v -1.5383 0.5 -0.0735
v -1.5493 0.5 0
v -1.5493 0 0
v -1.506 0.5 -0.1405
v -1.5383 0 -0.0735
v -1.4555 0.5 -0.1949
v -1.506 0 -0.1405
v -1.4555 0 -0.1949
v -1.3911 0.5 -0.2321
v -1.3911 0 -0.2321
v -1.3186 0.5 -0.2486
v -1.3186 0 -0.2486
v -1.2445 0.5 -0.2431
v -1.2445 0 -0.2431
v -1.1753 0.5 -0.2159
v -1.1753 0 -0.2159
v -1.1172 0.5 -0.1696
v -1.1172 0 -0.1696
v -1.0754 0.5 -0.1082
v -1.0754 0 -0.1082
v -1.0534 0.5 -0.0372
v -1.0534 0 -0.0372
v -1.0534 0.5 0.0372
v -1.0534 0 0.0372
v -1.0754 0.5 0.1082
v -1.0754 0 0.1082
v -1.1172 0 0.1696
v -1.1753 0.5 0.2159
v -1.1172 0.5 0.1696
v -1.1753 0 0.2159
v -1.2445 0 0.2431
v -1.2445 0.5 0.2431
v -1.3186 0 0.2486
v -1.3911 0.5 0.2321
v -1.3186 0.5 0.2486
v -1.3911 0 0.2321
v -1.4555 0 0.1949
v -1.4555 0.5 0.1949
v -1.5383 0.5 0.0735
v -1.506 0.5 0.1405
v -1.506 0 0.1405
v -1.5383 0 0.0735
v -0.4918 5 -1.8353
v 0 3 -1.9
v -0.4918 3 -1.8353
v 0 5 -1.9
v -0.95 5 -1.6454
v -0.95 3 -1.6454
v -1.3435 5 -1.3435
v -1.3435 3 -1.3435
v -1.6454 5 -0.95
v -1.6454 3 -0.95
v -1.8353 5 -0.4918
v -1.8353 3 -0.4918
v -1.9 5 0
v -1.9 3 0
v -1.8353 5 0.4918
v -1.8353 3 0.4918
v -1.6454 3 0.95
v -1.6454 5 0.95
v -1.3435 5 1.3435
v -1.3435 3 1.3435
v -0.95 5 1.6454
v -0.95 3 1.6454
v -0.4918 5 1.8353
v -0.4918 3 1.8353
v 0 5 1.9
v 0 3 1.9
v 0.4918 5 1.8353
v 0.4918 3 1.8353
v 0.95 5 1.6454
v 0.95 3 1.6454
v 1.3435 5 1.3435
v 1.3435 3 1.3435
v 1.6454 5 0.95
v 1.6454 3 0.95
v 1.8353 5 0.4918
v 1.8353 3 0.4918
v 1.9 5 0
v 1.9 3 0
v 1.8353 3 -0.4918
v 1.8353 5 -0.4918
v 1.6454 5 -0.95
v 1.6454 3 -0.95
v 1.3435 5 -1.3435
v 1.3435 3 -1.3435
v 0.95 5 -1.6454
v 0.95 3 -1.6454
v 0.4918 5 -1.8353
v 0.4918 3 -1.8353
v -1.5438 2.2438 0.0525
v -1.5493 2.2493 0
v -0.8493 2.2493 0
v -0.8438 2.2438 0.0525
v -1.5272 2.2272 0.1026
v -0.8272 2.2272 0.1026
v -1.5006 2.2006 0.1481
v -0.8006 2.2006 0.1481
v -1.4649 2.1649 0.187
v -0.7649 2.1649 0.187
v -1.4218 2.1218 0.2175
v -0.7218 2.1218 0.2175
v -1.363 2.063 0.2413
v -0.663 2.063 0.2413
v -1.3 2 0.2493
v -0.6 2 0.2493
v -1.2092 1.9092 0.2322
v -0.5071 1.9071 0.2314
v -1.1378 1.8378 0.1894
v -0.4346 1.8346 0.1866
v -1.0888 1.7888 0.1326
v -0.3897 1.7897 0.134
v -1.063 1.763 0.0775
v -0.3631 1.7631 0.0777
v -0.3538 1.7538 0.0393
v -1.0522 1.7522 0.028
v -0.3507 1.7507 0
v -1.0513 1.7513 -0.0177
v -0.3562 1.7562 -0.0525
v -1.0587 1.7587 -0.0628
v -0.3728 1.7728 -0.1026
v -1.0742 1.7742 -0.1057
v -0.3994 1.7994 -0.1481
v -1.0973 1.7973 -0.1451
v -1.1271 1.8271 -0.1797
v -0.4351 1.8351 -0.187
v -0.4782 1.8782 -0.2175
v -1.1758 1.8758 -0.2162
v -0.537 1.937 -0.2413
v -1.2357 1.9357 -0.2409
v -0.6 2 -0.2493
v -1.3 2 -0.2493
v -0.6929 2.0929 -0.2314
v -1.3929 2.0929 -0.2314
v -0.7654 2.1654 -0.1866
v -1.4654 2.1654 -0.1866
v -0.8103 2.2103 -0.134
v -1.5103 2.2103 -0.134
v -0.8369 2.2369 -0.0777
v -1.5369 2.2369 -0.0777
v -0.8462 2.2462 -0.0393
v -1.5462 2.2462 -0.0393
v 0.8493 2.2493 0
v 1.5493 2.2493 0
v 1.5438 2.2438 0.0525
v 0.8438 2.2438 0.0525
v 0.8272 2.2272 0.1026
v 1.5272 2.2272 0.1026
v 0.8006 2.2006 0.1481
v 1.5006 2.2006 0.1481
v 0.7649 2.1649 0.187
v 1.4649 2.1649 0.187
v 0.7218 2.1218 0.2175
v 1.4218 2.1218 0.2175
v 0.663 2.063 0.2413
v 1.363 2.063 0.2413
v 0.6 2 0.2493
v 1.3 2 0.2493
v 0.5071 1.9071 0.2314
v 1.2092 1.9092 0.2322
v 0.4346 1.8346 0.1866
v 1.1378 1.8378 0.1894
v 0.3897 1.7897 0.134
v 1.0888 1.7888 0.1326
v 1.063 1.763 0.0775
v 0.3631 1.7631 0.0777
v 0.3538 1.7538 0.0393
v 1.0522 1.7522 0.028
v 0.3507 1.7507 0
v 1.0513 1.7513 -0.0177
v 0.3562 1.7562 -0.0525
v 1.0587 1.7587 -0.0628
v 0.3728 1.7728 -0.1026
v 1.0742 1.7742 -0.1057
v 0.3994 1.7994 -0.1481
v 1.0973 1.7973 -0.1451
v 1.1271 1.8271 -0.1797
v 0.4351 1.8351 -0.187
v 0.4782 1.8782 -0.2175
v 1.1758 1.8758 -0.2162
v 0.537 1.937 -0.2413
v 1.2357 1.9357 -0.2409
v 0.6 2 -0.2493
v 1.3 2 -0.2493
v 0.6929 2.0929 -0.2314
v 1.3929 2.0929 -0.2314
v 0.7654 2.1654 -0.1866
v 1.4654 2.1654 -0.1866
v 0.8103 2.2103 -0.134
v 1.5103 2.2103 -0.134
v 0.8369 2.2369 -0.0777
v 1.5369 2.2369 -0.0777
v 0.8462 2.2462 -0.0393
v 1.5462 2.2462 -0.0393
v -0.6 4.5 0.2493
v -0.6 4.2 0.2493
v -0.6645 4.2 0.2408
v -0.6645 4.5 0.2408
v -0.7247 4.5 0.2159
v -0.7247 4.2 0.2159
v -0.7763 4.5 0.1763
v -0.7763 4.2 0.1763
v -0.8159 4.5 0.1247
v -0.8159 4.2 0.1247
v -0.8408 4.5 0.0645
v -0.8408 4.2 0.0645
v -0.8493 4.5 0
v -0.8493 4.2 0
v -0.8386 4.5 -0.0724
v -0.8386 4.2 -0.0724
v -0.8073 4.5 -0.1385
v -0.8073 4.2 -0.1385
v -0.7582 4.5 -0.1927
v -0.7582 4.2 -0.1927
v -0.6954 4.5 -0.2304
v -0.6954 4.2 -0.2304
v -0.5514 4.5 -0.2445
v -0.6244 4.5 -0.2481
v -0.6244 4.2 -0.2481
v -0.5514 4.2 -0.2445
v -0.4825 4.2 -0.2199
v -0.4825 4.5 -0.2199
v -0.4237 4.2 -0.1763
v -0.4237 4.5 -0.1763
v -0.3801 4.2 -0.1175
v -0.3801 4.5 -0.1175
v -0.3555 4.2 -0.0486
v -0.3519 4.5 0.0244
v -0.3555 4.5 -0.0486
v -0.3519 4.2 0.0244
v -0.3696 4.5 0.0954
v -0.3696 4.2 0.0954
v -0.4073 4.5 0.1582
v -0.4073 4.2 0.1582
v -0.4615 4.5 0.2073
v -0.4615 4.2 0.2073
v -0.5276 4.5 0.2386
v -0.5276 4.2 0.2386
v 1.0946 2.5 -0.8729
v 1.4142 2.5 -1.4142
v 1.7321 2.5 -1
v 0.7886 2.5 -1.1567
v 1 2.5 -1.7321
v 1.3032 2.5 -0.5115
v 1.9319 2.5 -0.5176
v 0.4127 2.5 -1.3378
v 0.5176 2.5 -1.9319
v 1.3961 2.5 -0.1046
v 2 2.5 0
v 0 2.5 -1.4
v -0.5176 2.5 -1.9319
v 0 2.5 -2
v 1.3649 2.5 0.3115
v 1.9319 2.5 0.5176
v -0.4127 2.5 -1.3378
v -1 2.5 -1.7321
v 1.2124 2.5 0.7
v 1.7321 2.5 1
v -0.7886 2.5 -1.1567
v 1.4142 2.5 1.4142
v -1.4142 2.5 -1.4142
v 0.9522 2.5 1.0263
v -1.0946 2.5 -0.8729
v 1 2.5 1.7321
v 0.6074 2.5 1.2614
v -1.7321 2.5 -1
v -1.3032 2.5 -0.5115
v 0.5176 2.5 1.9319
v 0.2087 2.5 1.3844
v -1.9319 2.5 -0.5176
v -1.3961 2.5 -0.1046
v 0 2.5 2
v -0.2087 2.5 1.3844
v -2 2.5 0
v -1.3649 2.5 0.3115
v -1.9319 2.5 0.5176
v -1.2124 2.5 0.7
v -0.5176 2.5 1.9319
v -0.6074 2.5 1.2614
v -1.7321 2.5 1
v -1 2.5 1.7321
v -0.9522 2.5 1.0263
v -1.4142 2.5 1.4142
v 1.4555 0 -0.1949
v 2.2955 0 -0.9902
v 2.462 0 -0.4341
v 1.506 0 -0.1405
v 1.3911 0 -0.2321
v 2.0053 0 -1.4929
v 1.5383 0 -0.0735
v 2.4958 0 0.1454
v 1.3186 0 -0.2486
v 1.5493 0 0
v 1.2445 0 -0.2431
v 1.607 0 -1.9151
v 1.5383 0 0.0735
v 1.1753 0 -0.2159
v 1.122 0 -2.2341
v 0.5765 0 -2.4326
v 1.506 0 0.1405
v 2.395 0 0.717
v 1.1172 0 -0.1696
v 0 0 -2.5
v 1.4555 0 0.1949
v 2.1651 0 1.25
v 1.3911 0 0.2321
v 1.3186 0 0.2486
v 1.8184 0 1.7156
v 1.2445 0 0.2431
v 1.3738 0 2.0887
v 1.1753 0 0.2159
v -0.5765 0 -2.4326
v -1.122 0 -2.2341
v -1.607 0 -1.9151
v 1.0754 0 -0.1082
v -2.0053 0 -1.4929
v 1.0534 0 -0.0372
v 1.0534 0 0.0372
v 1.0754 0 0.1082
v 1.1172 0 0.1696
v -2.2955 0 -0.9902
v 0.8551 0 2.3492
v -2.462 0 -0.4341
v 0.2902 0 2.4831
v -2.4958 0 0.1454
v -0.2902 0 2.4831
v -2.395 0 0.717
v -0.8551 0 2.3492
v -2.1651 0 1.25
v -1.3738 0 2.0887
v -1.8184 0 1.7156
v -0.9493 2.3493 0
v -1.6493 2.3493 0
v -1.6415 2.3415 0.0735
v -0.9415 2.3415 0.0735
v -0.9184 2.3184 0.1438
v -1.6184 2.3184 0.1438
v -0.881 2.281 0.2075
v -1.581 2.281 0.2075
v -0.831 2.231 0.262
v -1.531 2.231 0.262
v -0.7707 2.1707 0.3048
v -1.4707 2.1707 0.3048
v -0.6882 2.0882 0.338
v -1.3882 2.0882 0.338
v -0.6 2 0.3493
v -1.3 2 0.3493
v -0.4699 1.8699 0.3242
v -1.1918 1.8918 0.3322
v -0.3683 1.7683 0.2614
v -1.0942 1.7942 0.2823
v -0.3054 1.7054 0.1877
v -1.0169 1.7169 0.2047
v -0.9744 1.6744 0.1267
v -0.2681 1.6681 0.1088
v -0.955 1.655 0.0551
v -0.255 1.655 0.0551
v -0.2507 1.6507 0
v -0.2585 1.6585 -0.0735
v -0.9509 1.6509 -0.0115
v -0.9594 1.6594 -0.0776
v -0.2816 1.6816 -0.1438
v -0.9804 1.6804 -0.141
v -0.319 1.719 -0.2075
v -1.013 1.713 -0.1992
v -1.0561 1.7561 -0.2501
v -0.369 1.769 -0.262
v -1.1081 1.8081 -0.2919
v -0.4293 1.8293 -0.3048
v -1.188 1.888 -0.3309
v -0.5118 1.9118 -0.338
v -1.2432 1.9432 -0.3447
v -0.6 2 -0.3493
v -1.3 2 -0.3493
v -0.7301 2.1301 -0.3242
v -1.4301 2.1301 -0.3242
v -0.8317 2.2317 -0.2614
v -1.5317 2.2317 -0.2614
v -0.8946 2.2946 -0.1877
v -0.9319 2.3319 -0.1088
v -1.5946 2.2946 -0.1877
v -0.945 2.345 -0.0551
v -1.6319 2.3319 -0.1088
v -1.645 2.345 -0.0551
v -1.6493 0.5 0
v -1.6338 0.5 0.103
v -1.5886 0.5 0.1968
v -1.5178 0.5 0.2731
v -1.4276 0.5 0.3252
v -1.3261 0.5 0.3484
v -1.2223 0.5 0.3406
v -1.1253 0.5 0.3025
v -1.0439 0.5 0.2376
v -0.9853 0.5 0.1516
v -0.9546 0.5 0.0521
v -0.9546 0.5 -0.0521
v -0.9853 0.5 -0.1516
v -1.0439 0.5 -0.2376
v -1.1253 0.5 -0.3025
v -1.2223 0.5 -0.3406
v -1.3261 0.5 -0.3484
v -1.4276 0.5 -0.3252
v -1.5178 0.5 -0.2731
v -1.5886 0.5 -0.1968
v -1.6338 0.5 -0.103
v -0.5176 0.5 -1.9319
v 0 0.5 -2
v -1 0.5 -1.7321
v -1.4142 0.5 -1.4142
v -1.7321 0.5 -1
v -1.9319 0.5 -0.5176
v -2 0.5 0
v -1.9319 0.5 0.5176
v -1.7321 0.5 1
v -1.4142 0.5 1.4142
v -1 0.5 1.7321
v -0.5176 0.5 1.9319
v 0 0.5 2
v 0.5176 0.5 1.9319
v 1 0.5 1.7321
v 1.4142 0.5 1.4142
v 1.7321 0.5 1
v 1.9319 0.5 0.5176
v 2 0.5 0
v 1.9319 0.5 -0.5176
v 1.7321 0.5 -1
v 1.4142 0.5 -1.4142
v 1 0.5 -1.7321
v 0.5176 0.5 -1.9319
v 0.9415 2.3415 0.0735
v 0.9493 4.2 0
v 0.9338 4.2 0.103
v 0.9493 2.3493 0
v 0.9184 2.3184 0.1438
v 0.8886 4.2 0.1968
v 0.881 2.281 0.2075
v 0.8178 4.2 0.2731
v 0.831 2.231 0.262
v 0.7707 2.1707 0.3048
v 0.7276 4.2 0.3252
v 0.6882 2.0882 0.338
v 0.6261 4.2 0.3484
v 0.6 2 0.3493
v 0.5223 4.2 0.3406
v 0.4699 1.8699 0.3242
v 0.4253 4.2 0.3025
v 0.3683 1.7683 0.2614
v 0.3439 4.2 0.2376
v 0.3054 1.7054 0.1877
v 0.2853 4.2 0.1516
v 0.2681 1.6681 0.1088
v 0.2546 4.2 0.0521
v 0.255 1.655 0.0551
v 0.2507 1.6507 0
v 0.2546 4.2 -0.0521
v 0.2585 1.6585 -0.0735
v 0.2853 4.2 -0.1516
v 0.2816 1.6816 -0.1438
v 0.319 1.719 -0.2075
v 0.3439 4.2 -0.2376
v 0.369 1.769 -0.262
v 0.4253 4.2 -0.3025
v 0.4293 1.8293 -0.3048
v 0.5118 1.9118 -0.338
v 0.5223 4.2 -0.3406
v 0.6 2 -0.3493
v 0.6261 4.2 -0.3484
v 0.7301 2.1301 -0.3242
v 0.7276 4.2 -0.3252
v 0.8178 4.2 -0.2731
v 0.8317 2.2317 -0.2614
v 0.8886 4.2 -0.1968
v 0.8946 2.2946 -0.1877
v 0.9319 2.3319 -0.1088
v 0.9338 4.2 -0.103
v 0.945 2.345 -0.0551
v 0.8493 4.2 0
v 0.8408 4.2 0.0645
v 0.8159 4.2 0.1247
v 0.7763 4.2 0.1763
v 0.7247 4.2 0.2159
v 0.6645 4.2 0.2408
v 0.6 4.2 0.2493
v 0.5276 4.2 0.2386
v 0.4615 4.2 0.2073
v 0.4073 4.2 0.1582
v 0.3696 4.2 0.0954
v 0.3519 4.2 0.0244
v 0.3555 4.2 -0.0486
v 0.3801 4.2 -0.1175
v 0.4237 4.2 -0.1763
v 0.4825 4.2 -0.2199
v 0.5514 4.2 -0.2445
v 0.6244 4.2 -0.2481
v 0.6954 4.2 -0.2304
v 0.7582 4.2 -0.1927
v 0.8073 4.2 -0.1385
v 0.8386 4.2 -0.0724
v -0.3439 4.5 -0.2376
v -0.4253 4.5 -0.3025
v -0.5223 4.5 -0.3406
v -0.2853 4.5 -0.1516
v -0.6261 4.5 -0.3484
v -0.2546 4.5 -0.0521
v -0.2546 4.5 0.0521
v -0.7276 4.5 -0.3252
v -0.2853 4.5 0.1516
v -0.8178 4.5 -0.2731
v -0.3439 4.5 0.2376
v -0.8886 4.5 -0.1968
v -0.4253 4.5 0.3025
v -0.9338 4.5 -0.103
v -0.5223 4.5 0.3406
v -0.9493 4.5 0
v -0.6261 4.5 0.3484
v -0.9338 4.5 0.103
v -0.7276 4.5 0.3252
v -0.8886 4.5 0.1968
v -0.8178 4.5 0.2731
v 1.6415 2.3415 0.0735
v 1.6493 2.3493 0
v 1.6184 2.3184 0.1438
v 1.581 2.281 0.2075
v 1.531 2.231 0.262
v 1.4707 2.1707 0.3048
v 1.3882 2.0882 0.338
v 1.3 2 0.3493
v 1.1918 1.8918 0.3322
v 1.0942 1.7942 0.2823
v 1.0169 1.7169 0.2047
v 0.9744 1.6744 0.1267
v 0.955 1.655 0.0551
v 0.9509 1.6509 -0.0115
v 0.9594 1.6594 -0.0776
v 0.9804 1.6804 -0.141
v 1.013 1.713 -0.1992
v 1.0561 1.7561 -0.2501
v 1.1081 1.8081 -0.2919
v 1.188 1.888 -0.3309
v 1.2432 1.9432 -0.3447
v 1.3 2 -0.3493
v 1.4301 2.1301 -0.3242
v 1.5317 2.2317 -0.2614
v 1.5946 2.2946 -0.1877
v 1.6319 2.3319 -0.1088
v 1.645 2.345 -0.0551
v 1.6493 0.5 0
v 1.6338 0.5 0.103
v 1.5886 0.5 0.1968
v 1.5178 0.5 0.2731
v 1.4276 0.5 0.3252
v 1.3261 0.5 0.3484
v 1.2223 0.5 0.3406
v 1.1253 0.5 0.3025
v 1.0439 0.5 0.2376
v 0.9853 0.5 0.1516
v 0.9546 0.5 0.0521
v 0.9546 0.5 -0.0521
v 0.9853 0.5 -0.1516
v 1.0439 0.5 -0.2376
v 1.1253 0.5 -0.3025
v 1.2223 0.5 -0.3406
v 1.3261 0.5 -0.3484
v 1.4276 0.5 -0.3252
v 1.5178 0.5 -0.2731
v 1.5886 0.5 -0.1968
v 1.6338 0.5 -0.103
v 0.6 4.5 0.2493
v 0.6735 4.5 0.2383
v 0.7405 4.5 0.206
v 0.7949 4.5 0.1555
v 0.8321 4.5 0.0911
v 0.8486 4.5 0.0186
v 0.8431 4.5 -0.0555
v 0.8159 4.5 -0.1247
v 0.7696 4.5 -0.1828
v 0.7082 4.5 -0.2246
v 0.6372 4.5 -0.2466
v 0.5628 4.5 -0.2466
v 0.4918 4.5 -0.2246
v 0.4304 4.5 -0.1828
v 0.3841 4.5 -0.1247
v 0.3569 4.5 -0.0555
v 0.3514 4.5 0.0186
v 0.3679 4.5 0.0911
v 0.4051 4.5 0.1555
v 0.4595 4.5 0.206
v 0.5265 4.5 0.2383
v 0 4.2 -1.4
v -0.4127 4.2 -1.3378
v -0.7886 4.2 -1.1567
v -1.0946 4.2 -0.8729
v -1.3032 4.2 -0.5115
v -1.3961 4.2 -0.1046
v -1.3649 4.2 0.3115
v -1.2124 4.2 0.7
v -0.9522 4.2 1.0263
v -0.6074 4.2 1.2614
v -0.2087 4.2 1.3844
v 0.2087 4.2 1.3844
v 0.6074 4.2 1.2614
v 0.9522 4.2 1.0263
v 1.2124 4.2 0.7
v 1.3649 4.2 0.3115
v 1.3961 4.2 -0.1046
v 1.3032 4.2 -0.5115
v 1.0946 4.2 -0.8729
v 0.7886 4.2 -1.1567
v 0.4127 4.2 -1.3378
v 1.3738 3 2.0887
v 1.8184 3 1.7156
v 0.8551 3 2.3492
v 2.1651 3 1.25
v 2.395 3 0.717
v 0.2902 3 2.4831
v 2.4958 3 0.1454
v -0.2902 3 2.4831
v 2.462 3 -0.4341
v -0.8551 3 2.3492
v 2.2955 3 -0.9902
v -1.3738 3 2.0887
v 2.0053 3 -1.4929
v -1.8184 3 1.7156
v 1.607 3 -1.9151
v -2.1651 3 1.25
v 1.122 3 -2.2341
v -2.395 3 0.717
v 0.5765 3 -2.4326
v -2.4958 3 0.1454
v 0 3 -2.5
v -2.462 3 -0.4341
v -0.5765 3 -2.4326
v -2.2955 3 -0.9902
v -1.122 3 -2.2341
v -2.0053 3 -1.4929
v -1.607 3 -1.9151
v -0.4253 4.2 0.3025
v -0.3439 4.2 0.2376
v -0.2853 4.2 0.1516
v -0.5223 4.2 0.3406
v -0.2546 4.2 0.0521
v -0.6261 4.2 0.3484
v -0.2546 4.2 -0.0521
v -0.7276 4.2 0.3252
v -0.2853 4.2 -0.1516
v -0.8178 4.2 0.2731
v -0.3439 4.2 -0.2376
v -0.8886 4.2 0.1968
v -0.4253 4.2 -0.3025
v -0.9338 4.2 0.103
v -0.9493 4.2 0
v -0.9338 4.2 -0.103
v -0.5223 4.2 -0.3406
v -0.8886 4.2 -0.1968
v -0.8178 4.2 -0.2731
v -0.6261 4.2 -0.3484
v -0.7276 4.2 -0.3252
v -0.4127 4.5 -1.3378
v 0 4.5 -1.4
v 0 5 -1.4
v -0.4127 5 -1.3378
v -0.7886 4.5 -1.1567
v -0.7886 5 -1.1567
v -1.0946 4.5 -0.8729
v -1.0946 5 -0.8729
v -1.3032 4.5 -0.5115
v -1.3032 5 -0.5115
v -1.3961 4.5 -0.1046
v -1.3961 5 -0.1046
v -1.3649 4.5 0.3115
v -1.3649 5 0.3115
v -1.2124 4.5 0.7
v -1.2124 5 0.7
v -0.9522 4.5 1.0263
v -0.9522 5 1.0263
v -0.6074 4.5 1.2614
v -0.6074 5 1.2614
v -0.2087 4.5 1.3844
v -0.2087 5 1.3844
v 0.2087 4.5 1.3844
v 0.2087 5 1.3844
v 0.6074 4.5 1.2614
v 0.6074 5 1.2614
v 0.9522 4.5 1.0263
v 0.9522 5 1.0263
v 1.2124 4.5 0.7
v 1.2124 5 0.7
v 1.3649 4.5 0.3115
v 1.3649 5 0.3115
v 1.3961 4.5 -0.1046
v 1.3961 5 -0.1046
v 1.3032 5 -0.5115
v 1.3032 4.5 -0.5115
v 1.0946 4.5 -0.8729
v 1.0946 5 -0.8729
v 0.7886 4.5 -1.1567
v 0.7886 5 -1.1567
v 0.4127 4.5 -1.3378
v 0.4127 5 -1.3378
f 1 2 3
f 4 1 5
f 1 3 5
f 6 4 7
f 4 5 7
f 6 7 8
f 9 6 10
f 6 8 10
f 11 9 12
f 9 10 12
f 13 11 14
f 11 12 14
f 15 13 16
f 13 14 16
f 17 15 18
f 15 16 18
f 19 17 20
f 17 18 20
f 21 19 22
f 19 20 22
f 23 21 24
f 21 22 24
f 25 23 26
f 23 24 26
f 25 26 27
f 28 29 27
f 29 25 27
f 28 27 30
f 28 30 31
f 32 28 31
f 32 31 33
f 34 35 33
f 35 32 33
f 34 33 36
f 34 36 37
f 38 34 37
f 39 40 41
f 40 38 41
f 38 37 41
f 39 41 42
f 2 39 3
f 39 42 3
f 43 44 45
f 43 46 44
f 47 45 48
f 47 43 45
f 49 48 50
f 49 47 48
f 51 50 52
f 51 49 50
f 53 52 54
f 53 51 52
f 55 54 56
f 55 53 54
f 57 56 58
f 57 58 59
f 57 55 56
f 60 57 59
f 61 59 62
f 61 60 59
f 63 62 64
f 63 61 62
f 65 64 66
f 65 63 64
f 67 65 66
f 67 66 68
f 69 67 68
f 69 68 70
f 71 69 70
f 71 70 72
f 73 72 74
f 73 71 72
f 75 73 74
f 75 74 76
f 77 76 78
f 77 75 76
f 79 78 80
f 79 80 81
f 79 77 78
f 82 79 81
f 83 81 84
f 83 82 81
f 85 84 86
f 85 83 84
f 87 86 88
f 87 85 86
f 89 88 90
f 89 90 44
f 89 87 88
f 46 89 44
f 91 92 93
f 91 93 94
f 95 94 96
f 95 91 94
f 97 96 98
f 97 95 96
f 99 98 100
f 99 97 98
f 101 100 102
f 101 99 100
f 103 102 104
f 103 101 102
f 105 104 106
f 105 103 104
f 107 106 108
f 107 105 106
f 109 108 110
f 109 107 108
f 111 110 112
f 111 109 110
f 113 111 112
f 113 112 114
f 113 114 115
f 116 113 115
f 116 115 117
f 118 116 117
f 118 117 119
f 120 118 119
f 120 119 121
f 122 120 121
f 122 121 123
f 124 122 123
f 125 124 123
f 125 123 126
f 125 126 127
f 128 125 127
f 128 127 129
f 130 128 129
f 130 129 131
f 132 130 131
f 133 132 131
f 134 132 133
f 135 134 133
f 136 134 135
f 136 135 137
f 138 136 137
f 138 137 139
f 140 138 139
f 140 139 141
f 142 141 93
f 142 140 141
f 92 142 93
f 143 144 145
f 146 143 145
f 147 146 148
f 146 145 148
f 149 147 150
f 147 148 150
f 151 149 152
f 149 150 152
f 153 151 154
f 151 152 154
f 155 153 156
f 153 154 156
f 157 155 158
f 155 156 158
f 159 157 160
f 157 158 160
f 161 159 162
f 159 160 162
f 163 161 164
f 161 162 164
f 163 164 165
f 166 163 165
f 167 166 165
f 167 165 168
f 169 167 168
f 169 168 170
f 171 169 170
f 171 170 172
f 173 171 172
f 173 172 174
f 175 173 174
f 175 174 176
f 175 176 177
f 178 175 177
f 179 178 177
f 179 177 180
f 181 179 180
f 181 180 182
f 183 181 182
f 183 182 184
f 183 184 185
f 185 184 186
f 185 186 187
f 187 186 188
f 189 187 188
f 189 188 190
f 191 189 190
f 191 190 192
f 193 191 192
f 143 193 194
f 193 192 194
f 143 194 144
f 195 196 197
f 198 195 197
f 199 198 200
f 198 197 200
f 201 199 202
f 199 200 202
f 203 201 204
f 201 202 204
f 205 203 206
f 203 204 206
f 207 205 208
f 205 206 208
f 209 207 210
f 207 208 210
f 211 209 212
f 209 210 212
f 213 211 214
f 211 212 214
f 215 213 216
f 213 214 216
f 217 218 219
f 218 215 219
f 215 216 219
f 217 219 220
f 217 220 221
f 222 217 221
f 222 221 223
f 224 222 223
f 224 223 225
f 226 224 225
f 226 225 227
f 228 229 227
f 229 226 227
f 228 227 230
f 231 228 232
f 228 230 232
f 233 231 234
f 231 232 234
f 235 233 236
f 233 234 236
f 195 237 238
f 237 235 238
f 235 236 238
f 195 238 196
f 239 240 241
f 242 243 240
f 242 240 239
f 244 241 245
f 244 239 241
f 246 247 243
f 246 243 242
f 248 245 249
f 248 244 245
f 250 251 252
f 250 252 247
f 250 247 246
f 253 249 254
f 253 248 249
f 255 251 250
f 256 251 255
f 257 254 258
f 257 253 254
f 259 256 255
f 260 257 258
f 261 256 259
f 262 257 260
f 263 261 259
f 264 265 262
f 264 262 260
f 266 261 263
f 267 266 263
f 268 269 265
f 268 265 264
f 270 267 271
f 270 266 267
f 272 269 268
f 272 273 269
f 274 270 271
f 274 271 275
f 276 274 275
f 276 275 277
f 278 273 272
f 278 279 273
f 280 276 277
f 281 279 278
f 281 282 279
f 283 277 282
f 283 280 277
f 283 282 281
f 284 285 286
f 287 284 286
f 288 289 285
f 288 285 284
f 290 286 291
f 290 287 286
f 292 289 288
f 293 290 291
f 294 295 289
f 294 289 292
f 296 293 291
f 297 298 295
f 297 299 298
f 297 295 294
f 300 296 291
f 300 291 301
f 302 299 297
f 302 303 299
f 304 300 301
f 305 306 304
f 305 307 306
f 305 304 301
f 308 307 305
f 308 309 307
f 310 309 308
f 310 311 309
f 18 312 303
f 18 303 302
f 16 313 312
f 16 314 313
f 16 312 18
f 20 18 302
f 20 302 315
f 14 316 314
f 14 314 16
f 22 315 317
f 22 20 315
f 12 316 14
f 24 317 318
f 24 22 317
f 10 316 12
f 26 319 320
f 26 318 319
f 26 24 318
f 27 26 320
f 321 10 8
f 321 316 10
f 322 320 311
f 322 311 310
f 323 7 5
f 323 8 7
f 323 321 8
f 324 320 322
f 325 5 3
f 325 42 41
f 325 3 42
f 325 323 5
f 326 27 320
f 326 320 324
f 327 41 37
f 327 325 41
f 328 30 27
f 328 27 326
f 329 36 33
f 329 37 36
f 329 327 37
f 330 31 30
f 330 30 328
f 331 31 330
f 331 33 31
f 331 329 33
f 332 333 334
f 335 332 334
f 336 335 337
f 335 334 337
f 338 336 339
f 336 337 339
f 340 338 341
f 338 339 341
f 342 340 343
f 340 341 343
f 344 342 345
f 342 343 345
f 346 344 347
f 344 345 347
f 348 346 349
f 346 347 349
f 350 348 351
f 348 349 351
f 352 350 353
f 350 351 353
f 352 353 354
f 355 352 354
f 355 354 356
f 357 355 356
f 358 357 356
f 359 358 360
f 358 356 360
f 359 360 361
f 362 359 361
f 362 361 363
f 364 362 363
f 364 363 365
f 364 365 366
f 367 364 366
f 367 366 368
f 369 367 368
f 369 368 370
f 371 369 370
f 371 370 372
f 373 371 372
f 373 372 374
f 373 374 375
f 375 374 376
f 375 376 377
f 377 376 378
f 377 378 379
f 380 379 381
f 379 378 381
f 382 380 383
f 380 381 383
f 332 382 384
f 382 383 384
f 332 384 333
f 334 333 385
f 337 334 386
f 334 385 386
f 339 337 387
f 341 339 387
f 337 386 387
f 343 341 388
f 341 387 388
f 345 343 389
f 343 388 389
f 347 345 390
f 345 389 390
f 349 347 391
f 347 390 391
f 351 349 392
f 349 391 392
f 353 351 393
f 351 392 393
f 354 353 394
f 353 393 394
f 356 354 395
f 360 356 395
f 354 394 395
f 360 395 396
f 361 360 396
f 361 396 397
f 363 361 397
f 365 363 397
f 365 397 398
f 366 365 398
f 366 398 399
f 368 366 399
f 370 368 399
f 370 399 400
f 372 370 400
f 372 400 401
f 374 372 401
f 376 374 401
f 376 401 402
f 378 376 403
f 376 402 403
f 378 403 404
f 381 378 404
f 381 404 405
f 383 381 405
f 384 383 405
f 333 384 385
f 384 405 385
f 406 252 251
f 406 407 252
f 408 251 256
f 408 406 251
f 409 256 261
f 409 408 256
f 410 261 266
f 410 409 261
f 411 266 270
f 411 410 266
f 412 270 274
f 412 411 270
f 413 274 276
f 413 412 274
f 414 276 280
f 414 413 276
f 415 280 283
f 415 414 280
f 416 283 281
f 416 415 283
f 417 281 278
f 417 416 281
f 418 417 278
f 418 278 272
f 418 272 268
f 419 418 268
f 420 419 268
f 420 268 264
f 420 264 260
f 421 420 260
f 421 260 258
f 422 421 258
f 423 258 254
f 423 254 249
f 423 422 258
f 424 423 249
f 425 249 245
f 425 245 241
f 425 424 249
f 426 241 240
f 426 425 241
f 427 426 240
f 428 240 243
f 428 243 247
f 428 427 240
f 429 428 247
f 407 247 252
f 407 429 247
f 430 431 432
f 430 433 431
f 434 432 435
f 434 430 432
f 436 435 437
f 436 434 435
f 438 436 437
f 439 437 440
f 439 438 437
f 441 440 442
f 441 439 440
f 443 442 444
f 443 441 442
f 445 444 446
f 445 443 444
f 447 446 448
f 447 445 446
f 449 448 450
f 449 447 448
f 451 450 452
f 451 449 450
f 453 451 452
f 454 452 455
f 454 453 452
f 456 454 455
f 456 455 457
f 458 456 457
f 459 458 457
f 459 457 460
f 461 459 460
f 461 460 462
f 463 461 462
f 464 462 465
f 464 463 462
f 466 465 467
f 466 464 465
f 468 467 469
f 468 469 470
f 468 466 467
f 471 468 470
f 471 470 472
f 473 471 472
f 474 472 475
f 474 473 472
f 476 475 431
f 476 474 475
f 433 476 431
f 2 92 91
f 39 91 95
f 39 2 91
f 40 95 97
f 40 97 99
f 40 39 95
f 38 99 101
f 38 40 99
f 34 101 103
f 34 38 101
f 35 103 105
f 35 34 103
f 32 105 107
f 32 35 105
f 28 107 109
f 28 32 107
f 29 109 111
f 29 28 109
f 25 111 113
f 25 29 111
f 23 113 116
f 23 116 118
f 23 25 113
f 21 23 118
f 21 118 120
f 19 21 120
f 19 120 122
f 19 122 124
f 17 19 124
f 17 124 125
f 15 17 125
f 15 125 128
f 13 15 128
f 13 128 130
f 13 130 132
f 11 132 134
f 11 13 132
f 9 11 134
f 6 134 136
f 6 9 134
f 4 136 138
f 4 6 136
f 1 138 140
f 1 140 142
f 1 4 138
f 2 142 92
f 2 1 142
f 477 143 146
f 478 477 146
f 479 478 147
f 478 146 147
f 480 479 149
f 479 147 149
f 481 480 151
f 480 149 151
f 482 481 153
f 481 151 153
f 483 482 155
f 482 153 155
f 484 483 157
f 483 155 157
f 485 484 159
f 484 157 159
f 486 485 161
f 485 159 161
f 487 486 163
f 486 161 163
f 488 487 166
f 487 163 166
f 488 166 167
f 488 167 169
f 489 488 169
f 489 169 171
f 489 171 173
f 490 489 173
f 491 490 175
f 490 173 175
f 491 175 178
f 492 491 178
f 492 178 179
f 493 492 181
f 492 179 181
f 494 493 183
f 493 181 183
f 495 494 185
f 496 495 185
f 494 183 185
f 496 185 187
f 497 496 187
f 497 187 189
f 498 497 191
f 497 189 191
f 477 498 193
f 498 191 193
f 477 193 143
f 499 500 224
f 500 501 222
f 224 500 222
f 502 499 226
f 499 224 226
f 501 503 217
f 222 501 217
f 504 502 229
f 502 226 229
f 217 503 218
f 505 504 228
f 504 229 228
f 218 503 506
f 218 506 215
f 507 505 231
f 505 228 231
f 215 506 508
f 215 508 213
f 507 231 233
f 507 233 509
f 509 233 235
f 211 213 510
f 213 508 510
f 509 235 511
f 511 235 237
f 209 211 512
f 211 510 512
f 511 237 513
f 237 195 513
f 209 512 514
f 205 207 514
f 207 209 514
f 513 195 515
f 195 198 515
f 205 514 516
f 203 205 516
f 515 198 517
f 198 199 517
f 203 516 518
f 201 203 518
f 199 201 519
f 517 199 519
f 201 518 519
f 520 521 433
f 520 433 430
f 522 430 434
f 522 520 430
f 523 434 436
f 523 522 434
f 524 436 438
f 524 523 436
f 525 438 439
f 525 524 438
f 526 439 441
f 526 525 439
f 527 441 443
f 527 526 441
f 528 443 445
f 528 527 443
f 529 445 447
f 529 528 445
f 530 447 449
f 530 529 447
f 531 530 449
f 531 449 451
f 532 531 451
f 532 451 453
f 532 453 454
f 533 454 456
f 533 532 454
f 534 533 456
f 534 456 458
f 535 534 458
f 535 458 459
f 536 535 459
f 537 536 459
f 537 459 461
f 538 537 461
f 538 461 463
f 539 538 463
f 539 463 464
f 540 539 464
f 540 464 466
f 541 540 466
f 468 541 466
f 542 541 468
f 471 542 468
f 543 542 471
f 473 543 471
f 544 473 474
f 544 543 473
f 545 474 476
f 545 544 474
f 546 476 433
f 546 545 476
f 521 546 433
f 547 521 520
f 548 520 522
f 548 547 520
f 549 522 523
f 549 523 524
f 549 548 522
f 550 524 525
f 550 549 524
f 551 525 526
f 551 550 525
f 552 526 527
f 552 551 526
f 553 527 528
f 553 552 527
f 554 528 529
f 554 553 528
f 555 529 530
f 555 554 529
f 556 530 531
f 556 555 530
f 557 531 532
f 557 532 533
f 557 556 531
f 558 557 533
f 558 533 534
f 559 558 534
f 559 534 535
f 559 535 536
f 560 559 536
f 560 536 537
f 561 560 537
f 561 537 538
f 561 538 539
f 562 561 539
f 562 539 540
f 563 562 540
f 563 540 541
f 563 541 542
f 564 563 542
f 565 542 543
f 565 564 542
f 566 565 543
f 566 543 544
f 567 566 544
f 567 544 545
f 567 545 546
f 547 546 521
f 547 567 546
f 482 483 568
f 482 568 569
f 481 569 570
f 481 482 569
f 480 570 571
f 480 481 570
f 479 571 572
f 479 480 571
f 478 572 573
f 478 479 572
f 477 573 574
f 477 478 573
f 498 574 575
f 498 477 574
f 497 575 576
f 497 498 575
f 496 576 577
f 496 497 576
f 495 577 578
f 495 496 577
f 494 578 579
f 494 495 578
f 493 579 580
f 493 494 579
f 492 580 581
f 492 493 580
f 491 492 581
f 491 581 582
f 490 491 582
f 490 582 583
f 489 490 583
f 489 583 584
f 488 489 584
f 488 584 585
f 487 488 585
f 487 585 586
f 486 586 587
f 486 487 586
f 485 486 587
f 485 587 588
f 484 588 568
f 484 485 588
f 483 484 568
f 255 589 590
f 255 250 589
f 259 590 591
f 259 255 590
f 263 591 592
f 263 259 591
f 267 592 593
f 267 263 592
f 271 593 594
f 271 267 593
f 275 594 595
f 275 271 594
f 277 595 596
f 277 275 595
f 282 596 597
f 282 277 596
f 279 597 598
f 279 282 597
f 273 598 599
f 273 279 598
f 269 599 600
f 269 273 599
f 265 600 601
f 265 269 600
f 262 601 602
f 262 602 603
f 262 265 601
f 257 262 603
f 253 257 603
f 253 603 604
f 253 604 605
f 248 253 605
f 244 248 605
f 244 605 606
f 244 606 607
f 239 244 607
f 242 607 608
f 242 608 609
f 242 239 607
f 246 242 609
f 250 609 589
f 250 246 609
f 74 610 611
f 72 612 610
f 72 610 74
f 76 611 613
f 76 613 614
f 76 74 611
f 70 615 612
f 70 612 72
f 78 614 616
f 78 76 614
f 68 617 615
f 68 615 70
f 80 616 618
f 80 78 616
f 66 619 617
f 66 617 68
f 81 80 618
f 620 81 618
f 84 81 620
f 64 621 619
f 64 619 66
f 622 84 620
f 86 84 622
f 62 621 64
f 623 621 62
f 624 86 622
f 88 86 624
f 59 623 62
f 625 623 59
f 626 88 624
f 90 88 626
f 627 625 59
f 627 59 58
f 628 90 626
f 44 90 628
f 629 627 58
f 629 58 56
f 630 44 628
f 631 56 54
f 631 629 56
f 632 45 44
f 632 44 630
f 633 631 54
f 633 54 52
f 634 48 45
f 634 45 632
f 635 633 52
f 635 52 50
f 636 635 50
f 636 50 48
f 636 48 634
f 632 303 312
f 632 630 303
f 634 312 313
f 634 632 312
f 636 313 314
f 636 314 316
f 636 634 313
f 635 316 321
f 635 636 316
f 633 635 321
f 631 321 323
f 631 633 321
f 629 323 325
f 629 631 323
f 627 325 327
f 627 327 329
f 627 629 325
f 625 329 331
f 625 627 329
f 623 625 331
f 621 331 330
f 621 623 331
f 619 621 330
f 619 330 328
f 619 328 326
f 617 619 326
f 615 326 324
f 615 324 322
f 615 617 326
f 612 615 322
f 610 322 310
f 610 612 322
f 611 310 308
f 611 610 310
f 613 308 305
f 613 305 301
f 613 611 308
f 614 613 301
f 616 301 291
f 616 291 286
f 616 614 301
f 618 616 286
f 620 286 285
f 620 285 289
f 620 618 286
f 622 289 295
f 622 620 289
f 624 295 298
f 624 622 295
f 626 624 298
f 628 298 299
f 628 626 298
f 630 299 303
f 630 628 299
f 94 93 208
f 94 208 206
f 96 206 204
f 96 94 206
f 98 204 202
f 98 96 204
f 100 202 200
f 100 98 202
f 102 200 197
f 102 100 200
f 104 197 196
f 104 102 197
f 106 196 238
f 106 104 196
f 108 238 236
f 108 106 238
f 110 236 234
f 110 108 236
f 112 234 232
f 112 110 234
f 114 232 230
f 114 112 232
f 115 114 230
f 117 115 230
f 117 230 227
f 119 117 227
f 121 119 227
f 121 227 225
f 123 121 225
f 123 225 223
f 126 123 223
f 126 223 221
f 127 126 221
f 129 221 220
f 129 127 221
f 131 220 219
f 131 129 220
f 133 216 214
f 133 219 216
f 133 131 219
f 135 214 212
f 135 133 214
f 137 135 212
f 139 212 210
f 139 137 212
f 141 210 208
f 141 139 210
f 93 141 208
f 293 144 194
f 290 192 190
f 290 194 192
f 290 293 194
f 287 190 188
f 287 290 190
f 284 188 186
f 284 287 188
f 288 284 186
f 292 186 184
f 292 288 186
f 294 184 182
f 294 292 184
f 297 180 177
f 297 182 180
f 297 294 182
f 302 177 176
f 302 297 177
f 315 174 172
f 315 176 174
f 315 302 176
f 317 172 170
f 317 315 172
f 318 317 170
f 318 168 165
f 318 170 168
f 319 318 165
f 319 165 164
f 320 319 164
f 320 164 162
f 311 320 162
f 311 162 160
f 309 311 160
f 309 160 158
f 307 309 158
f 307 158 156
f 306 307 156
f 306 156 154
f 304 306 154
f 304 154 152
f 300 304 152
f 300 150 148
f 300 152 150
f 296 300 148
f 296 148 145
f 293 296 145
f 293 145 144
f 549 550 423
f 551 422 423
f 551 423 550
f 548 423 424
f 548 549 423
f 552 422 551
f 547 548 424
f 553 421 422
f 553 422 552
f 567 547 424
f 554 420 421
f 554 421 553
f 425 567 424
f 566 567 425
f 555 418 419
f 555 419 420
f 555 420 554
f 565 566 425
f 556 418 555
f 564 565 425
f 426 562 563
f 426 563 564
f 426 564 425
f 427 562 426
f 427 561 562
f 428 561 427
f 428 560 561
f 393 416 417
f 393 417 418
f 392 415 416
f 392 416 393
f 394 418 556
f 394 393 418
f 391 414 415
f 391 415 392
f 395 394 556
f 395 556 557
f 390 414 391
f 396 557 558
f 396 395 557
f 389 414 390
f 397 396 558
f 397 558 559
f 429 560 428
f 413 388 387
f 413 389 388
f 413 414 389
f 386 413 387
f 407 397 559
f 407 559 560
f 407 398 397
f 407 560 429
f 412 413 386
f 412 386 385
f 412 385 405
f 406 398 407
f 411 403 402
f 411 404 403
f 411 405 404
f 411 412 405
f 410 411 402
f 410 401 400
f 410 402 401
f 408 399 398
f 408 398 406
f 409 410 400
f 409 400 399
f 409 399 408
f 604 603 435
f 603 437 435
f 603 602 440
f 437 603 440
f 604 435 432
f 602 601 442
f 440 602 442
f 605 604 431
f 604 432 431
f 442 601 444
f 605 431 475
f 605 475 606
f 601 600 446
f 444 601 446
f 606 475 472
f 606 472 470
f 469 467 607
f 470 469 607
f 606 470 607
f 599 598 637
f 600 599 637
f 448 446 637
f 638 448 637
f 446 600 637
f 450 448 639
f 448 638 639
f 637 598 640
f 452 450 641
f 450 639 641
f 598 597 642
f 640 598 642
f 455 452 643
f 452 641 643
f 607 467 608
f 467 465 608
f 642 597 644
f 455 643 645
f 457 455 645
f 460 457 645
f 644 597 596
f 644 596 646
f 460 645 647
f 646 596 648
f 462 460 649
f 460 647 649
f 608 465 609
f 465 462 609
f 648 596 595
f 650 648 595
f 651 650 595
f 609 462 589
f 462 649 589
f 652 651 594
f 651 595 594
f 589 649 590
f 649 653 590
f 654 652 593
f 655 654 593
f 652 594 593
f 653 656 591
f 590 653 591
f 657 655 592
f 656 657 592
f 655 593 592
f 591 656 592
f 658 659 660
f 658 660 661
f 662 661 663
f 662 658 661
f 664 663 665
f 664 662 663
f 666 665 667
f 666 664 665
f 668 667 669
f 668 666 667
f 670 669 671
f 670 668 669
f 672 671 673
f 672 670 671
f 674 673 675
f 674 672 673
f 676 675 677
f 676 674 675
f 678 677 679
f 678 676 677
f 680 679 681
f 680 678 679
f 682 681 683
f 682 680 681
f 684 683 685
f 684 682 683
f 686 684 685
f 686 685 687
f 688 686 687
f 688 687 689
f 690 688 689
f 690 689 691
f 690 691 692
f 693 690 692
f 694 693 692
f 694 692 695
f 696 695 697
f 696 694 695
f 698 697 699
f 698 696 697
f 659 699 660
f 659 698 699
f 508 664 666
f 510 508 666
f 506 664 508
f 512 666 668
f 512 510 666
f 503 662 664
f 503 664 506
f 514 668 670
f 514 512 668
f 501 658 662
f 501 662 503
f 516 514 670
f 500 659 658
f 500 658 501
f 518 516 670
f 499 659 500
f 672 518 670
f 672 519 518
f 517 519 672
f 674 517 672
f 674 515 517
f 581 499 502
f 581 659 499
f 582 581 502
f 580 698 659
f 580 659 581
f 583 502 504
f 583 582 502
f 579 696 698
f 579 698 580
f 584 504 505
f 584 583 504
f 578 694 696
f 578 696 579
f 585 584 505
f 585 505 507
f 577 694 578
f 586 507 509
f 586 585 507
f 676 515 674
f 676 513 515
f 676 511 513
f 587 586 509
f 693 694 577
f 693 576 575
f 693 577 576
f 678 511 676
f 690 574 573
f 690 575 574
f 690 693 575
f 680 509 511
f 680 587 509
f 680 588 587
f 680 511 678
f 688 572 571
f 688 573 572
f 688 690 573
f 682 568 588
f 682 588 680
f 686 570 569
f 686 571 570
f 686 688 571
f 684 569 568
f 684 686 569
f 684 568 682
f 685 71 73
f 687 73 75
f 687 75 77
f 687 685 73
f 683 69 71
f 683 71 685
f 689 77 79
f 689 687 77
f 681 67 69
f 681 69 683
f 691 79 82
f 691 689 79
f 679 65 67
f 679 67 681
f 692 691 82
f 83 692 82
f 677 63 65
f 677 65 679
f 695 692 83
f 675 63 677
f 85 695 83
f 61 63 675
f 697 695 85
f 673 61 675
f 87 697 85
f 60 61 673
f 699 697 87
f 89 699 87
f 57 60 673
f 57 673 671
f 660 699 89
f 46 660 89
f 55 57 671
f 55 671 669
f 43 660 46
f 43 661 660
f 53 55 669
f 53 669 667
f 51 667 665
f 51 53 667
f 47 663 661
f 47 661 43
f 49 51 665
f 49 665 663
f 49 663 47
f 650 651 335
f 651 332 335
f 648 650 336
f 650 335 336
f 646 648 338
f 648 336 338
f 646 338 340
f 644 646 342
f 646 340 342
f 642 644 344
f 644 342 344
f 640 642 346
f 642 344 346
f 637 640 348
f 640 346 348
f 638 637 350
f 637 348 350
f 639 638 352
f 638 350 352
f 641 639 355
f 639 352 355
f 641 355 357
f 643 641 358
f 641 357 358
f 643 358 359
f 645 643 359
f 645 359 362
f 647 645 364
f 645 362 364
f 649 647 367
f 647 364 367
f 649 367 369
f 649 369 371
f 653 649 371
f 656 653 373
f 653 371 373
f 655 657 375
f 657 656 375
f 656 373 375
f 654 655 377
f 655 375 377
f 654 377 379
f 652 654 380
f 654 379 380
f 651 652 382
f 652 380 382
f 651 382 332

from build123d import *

# Parameters (mm, degrees)
BOSS_EXTRUDE1_START = -0.3
SKETCH3_R           = 1.4
BOSS_EXTRUDE1_DEPTH = 0.3
SKETCH4_R           = 0.349337209
SKETCH4_R_2         = 0.249337209
CUT_EXTRUDE6_START  = -0.7
SKETCH8_R           = 0.249337209
CUT_EXTRUDE6_DEPTH  = 0.7
CUT_EXTRUDE7_START  = -0.3
SKETCH4_5_R         = 0.249337209
CUT_EXTRUDE7_DEPTH  = 0.3


with BuildPart() as part:
    # Sketch2 → Revolve1 (revolve)
    with BuildSketch(Plane(origin=(0, 0, 0), x_dir=(0, 0, -1), z_dir=(1, 0, 0))):
        Polygon((0, 0), (2.5, 0), (2.5, 3), (1.9, 3), (1.9, 5), (1.4, 5), (1.4, 2.5), (2, 2.5), (2, 0.5), (0, 0.5), align=None)
    revolve(axis=Axis((0, 0, 0), (0, 1, 0)))

    # Sketch3 → Boss-Extrude1 (add)
    with BuildSketch(Plane(origin=(0, 4.5, 0), x_dir=(1, 0, 0), z_dir=(0, 1, 0)).offset(BOSS_EXTRUDE1_START)):
        Circle(SKETCH3_R)
    extrude(amount=BOSS_EXTRUDE1_DEPTH)

    # Sweep2: sweep along a path in Sketch5
    with BuildLine(Plane.XY) as sweep2_path:
        Line((0.6, 4.5), (0.6, 2))
        Line((0.6, 2), (1.3, 2))
        Line((1.3, 2), (1.3, 0.5))
    # Sketch4 → Sweep2 (sweep)
    with BuildSketch(Plane(origin=(0, 4.5, 0), x_dir=(1, 0, 0), z_dir=(0, 1, 0))):
        with Locations((0.6, 0)):
            Circle(SKETCH4_R)
        with Locations((0.6, 0)):
            Circle(SKETCH4_R_2, mode=Mode.SUBTRACT)
    sweep2 = sweep(path=sweep2_path.line, transition=Transition.RIGHT)

    # Sketch8 → Cut-Extrude6 (cut)
    with BuildSketch(Plane(origin=(0, 0.5, 0), x_dir=(1, 0, 0), z_dir=(0, 1, 0)).offset(CUT_EXTRUDE6_START)):
        with Locations((1.3, 0)):
            Circle(SKETCH8_R)
    cut_extrude6 = extrude(amount=CUT_EXTRUDE6_DEPTH, mode=Mode.SUBTRACT)

    # Sketch4<5> → Cut-Extrude7 (cut)
    with BuildSketch(Plane(origin=(0, 4.5, 0), x_dir=(1, 0, 0), z_dir=(0, 1, 0)).offset(CUT_EXTRUDE7_START)):
        with Locations((0.6, 0)):
            Circle(SKETCH4_5_R)
    cut_extrude7 = extrude(amount=CUT_EXTRUDE7_DEPTH, mode=Mode.SUBTRACT)

    # Mirror1: Sweep2, Cut-Extrude6, Cut-Extrude7 across plane
    add(sweep2.mirror(Plane(origin=(0, 0, 0), x_dir=(0, 0, 1), z_dir=(1, 0, 0))))
    add(cut_extrude6.mirror(Plane(origin=(0, 0, 0), x_dir=(0, 0, 1), z_dir=(1, 0, 0))), mode=Mode.SUBTRACT)
    add(cut_extrude7.mirror(Plane(origin=(0, 0, 0), x_dir=(0, 0, 1), z_dir=(1, 0, 0))), mode=Mode.SUBTRACT)


solid = part.part
